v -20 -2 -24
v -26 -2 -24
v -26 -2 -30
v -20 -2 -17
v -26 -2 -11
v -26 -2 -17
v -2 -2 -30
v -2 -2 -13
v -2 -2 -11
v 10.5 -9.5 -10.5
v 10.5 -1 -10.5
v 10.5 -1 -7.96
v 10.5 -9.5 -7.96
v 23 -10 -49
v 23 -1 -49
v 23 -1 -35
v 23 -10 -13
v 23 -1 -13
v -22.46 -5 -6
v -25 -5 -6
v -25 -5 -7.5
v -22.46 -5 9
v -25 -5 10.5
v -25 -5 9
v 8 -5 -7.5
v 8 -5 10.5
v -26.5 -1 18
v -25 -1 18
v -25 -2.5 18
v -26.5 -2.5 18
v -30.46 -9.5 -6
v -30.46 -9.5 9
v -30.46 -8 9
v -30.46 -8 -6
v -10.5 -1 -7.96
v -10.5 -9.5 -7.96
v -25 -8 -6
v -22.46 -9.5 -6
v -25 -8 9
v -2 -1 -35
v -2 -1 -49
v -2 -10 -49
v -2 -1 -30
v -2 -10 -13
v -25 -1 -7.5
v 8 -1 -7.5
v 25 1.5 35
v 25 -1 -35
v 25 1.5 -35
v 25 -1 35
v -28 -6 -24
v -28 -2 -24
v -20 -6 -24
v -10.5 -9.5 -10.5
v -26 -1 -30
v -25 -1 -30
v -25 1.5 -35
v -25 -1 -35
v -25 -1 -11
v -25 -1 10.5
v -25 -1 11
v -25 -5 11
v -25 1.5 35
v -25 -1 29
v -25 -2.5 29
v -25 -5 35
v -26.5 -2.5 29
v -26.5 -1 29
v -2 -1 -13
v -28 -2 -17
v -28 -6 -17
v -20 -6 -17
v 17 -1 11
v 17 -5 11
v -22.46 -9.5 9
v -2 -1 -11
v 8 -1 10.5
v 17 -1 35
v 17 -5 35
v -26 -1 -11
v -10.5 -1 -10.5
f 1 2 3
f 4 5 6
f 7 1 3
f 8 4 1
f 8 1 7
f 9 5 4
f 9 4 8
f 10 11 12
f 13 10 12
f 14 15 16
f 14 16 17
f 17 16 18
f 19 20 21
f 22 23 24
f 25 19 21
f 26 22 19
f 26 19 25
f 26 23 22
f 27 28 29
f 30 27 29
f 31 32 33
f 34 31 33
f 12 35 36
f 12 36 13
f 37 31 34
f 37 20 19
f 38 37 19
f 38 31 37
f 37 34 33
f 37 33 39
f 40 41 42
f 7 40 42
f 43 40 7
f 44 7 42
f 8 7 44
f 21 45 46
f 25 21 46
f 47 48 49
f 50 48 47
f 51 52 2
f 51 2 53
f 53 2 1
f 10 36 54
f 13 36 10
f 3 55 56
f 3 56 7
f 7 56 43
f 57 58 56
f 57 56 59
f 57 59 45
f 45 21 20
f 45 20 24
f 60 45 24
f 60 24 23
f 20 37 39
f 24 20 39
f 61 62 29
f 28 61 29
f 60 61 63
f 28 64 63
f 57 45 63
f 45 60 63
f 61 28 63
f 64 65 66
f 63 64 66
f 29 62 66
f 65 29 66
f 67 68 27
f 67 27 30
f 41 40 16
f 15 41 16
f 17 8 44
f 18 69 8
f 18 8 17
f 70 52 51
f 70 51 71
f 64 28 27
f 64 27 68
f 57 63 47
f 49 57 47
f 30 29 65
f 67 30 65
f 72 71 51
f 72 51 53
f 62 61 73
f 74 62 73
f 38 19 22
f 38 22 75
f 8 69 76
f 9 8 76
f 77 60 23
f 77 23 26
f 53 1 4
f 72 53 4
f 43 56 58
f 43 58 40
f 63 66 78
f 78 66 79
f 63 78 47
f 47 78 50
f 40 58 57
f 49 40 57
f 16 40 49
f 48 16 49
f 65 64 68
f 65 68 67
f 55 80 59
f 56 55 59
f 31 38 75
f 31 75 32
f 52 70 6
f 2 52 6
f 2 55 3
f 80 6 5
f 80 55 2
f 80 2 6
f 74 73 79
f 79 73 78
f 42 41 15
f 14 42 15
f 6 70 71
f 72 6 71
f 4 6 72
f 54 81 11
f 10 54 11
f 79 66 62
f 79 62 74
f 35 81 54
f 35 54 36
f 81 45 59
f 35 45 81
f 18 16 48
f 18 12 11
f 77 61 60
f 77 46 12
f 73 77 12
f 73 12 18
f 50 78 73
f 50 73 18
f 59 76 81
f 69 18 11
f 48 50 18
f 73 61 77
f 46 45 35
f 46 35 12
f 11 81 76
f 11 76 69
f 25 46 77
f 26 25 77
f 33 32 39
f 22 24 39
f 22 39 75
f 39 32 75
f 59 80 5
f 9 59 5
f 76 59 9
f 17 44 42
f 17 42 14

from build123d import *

# Parameters (mm, degrees)
F0_W      = 50
F0_H      = 70
F1_DEPTH  = 1
F2_W      = 42
F2_H      = 24
F3_DEPTH  = 4
F4_W      = 25
F4_H      = 36
F5_DEPTH  = 9
F6_W      = 24
F6_H      = 19
F7_DEPTH  = 1
F8_W      = 8
F8_H      = 7
F9_DEPTH  = 4
F10_W     = 33
F10_H     = 18
F11_DEPTH = 4
F12_W     = 2.54
F12_H     = 15
F13_DEPTH = 3
F15_DEPTH = 15
F16_W     = 21
F16_H     = 2.54
F17_DEPTH = 8.5
F18_W     = 1.5
F18_H     = 11
F19_DEPTH = 1.5
F20_DEPTH = 1.5


with BuildPart() as f1:
    # F0 (on Front) → F1 (new body)
    with BuildSketch(Plane.XZ):
        Rectangle(F0_W, F0_H)
    extrude(amount=F1_DEPTH)

    # F2 (on face) → F3 (join)
    with BuildSketch(Plane.XZ.offset(1)):
        with Locations((-4, 23)):
            Rectangle(F2_W, F2_H)
    extrude(amount=F3_DEPTH)

    # F4 (on face) → F5 (join)
    with BuildSketch(Plane.XZ.offset(1)):
        with Locations((10.5, -31)):
            Rectangle(F4_W, F4_H)
    extrude(amount=F5_DEPTH)

    # F6 (on face) → F7 (join)
    with BuildSketch(Plane.XZ.offset(1)):
        with Locations((-14, -20.5)):
            Rectangle(F6_W, F6_H)
    extrude(amount=F7_DEPTH)

    # F8 (on face) → F9 (join)
    with BuildSketch(Plane.XZ.offset(2)):
        with Locations((-24, -20.5)):
            Rectangle(F8_W, F8_H)
    extrude(amount=F9_DEPTH)

    # F10 (on face) → F11 (join)
    with BuildSketch(Plane.XZ.offset(1)):
        with Locations((-8.5, 1.5)):
            Rectangle(F10_W, F10_H)
    extrude(amount=F11_DEPTH)

    # F12 (on face) → F13 (join)
    with BuildSketch(Plane.XZ.offset(5)):
        with Locations((-23.73, 1.5)):
            Rectangle(F12_W, F12_H)
    extrude(amount=F13_DEPTH)

    # F14 (on face) → F15 (join, through all)
    with BuildSketch(Plane(origin=(0, 0, -6), x_dir=(1, 0, 0), z_dir=(0, 0, -1))):
        Polygon((-22.46, 9.5), (-30.46, 9.5), (-30.46, 8), (-25, 8), (-22.46, 8), align=None)
    extrude(amount=-F15_DEPTH)

    # F16 (on face) → F17 (join)
    with BuildSketch(Plane.XZ.offset(1)):
        with Locations((0, -9.23)):
            Rectangle(F16_W, F16_H)
    extrude(amount=F17_DEPTH)

    # F18 (on face) → F19 (join)
    with BuildSketch(Plane(origin=(-25, 0, 0), x_dir=(0, -1, 0), z_dir=(-1, 0, 0))):
        with Locations((1.75, 23.5)):
            Rectangle(F18_W, F18_H)
    extrude(amount=F19_DEPTH)

    # F20 (add): a face of the model
    f20_faces = [f1.faces().sort_by_distance(p)[0] for p in [
        (0, 0, 0),
    ]]
    extrude(f20_faces, amount=F20_DEPTH)


solid = f1.part
